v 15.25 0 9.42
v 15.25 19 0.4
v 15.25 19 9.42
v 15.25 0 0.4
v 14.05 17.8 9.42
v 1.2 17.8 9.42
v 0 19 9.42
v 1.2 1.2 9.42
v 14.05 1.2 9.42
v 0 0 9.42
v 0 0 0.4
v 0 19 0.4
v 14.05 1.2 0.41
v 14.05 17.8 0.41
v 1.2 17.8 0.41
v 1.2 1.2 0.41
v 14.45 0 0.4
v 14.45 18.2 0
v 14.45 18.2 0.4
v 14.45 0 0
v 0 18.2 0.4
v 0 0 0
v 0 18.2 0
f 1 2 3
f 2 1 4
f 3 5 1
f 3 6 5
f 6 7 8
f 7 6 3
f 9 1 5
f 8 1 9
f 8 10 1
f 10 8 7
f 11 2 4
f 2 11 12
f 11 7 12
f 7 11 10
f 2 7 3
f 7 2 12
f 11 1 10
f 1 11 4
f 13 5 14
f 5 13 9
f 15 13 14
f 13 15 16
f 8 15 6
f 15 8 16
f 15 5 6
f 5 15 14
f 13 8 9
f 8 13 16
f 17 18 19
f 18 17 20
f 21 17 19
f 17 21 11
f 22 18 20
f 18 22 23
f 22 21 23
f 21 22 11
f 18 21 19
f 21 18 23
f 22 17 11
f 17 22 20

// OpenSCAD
// file: ../../Base/Boxes.scad
// Fischertechnik Box Foundation
// Pre-designed Boxes

use <Constants.scad>

include <PlacementOptions.scad>

box190Width = 190;
box190Depth = 130;
box130Width = 130;
box130Depth = 95;
boxUsageHeight = 33.9;
boxWallThickness = 2.4;
boxBaseThickness = 1.0;
boxWebWidth = 3.0;

// getBoxWallThickness()
// Gets the wall thickness of a Fischertechnik Box

function getBoxWallThickness() = boxWallThickness;

// Gets the usable height of a fischertechnik box
function getBoxUsageHeight() = boxUsageHeight;

// Gets the thickness of the Fischertechnik box base.
function getBoxBaseThickness() = boxBaseThickness;

// Gets the width of a box web
function getBoxWebWidth() = boxWebWidth;

// Gets the usable inner space of a Box 190 as an x/y-list
function getBox190Space() = [
    box190Width - 2*getBoxWallThickness(), 
    box190Depth - 2*getBoxWallThickness() ];

// Imports the Fischertechnik empty box 130x190 mm and places it at position 0,0
// 190x130 are the outer sizes, the inner space is slightly smaller. Use getBox190Space() to get the inner sizes.
// This module needs the STL file "Fischertechnik Box 130x190.stl" in the library path.
// The box is positioned that the usable inner space is at the 0,0,0 position. The

module Box190() {
    translate([-getBoxWallThickness(),-getBoxWallThickness(),-getBoxBaseThickness()])
        import("Fischertechnik Box 130x190.stl", convexity=3);
}

// Gets the usable inner space of a Box 130 as an x/y-list
function getBox130Space() = [
    box130Width - 2*getBoxWallThickness(), 
    box130Depth - 2*getBoxWallThickness() ];

// Imports the Fischertechnik empty box 95x130 mm and places it at position 0,0
// 190x130 are the outer sizes, the inner space is slightly smaller. Use getBox190Space() to get the inner sizes.
// This module needs the STL file "Fischertechnik Box 95x130.stl" in the library path.
// The box is positioned that the usable inner space is at the 0,0,0 position. The

module Box130() {
    translate([-getBoxWallThickness(),-getBoxWallThickness(),-getBoxBaseThickness()])
        import("Fischertechnik Box 95x130.stl", convexity=3);
}

// Creates a web at the specified box walls
// corner 0 = LowerLeft, 1 = UpperLeft, 2 = UpperRight, 3 = LowerRight
// side 0 = LeftOfCorner, 1 = RightOfCorner
// distance = Distance in mm from the corner
// box = inner width and depth of the box (default: Box 190)
// webWidth = length of the web (default is 3 mms)
// webThickness = thickness of the web (default is 1 mm)

module BoxWeb(corner, side, distance, box=getBox190Space(), webWidth=getBoxWebWidth(), webThickness=1.0) {
    sink = getBoxWallThickness()/2;

    width = (corner % 2 == 0) ? 
            (side == LeftOfCorner ? webWidth : webThickness) :
            (side == LeftOfCorner ? webThickness : webWidth);

    depth = (corner % 2 == 0) ? 
            (side == RightOfCorner ? webWidth : webThickness) :
            (side == RightOfCorner ? webThickness : webWidth);
    
    xDiff = corner == LowerLeft ? 
                (side == LeftOfCorner ? -sink : distance) :
            (corner == UpperLeft ?                
                (side == LeftOfCorner ? distance : -sink) :
            (corner == UpperRight ?
                (side == LeftOfCorner ? box.x-webWidth+sink : box.x-distance-webThickness) :
                (side == LeftOfCorner ? box.x-distance-webThickness: box.x-webWidth+sink)));

    yDiff = corner == LowerLeft ? 
                (side == RightOfCorner ? -sink : distance) :
            (corner == UpperLeft ?
                (side == RightOfCorner ? box.y-distance : box.y-webWidth+sink) :
            (corner == UpperRight ?
                (side == RightOfCorner ? box.y-webWidth+sink : box.y-distance) :
                (side == RightOfCorner ? distance : -sink)));
    
    translate([xDiff, yDiff, -getExcess()])
        cube([width, depth, boxUsageHeight + 2*getExcess()]);
}
// file: ../../Base/Rotation.scad
// Fischertechnik Box Foundation
// Geometry Helpers Rotation

include <PlacementOptions.scad>

// getRotatedSpace(space, rotation=NoRotation)
// Rotates the space dependent on the specified rotation

function getRotatedSpace(space, rotation=NoRotation) = [
    (rotation == Rotate90 || rotation == Rotate270) ? space.y : space.x,
    (rotation == Rotate90 || rotation == Rotate270) ? space.x : space.y
];

// Rotates the given space around the fixed left lower corner
// space = the space the children needs as width/depth list [width,depth]
// rotation = 0 Rotate0 degrees, 1 Rotate90 degrees, 2 Rotate180 degrees, 3 Rotate270 degrees (equivalent to -90)

module RotateFix(space, rotation=Rotate0) {
    dy = (rotation == Rotate0 || rotation == Rotate270) ? 0 :
        (rotation == Rotate90) ? space.x :
        space.y;
    dx = (rotation < Rotate180) ? 0 :
        (rotation == Rotate180) ? space.x :
        space.y;
    
    translate([dx, dy, 0])
        rotate([0, 0, rotations[rotation]])
            children();
}
// file: ../../Base/Alignment.scad
// Fischertechnik Box Foundation
// Geometry Helpers Alignment

include <PlacementOptions.scad>

// getAlignedX(elementWidth, spaceWidth, align=AlignRight, offset=0)
// Gets the aligned X offset of an element with the given
// width in the given space.
// elementWidth = The width of the element to positon
// spaceWidth = The space where the element should be aligned
// align = 0 AlignLeft, 1 AlignCenter, 2 AlignRight
// offset = an optional offset from the aligned position. When
// aligned left or centered, then positive values are in X direction.
// When aligned right then positive values are in negative X direction.

function getAlignedX(elementWidth, spaceWidth, align=AlignRight, offset=0) =
    (align == AlignLeft) ?
        offset :
        ((align == AlignCenter) ?
        (spaceWidth - elementWidth)/2 + offset :
        spaceWidth - offset - elementWidth);

// getAlignedY(elementDepth, spaceDepth, align=AlignTop, offset=0)
// Gets the aligned Y offset of an element with the given
// depth in the given space.
// elementDepth = The depth of the element to positon
// spaceDepth = The space where the element should be aligned
// align = 0 AlignBottom, 1 AlignCenter, 2 AlignTop
// offset = an optional offset from the aligned position. When
// aligned bottom or centered, then positive values are in Y direction.
// When aligned top then positive values are in negative Y direction.

function getAlignedY(elementDepth, spaceDepth, align=AlignTop, offset=0) =
    (align == AlignBottom) ?
        offset :
        ((align == AlignCenter) ?
        (spaceDepth - elementDepth)/2 + offset :
        spaceDepth - offset - elementDepth);
// file: ../../Base/PlacementOptions.scad
// Fischertechnik Box Foundation
// Placement Options

// Alignment
NoAlign = 0;
AlignLeft = 1;
AlignBottom = 2;
AlignCenter = 3;
AlignRight = 4;
AlignTop = 5;

// Element rotation degree steps
rotations = [0, -90, -180, -270];

// Rotation
NoRotation = 0;
Rotate0 = 0;
Rotate90 = 1;
Rotate180 = 2;
Rotate270 = 3;

// Docking (seen from above)
NoDock = -1;
DockLeft = 0;
DockTop = 1;
DockRight = 2;
DockCorner = 2;
DockBottom = 3;

// Web corners
LowerLeft = 0;
UpperLeft = 1;
UpperRight = 2;
LowerRight = 3;

// Web position relative to corner
LeftOfCorner = 0;
RightOfCorner = 1;
// file: ../../Base/Placement.scad
// Fischertechnik Box Foundation
// Geometry Helpers Placement

use <Constants.scad>
use <Alignment.scad>
use <Rotation.scad>
use <Boxes.scad>

include <PlacementOptions.scad>

// Place(x=0, y=0, elementSpace=[0,0], alignX=AlignLeft, alignY=AlignBottom, rotation=Rotate0, boxSpace=getBox190Space())
// Places the child at the specified position
// y = Y-Position. This is a relative position when an X aligment is specified.
// x = X-Position. This is a relative position when an Y aligment is specified.
// elementSpace = space of the element to be placed [x,y]
// alignX = -1=NoAlign, 0 AlignLeft, 1 AlignCenter, 3 AlignRight (elementSpace and boxSpace required!)
// alignY = -1=NoAlign, 2 AlignBottom, 1 AlignCenter, 4 AlignTop (elementSpace and boxSpace required!)
// rotation = 0 Rotate0 0 degrees, 1 Rotate90 90 degrees, 
// 2 Rotate180 180 degrees, 3 Rotate270 270 degrees (equivalent to -90)
// boxSpace = Inner space of the box where the placement occurs [x,y] - default is Box 190x130 inner space

module Place(x=0, y=0, elementSpace=[0,0], 
  alignX=AlignLeft, alignY=AlignBottom, 
  rotation=NoRotation, boxSpace=getBox190Space()) {

    module Position(x, y, space, rotation=Rotate0) {
        translate([x, y, 0])
            RotateFix(space, rotation)
                children();
    }

    space = getRotatedSpace(elementSpace, rotation);
    alignedX = getAlignedX(space.x, boxSpace.x, alignX, x);
    alignedY = getAlignedY(space.y, boxSpace.y, alignY, y);
    Position(alignedX, alignedY, elementSpace, rotation)
        children();
}

// Center(space=getBox130Space(), elementSpace=[0,0])
// space = Space where the children is centered. For cylinder use centered=true and no elementSpace.
// elementSpace = space of the element to be centered [x,y]

module Center(space=getBox190Space(), elementSpace=[0,0]) {
    translate([(space.x - elementSpace.x) / 2, (space.y - elementSpace.y) / 2])
        children(0);
}

// CenterHorizontal(width=0, y=0, offset=0, space=getBox130Space())
// space = Space where the children is centered. For cylinder use centered=true and no elementSpace.
// elementSpace = space of the element to be centered [x,y]

module CenterHorizontal(width=0, y=0, offset=0, space=getBox190Space()) {
    translate([(space.x - width) / 2 + offset, y])
        children(0);
}

// CenterVertical(depth=0, x=0, offset=0, space=getBox130Space())
// space = Space where the children is centered. For cylinder use centered=true and no elementSpace.
// elementSpace = space of the element to be centered [x,y]

module CenterVertical(depth=0, x=0, offset=0, space=getBox190Space()) {
    translate([x, (space.y - depth) / 2 + offset])
        children(0);
}
// file: ../../Elements/AxisClip10.scad
// Fischertechnik Box Library
// Axis for clip 10
// 31023

use <../ModelBase/Simple.scad>

width = 12;
depth = 12;
height = 23;

// getAxisClip10Space()
// Gets the space of a frame for a clip 10 with spring ring (mot2)

function getAxisClip10Space() = [width, depth, height];

// AxisClip10()
// Axis for clip 10 with spring ring (mot2)

module AxisClip10() {
    LeveledAxisWithSpace(height, height-10, getAxisClip10Space());
}

// Tests
color("lightgray")
AxisClip10();
// file: ../../Base/Constants.scad
// Fischertechnik Box Foundation
// Constants

// Constant values necessary for multiple elements

// Base constants
dividerThickness = 1.2;
excess = 0.01;
fragments = 90;
tolerance = 0.8;

// Gets the thickness of a divider 
function getDividerThickness() = dividerThickness;

// Gets the excess that is used to merge walls into each other
function getExcess() = excess;

// Gets amount of fragments of a cylinder
function getFragments() = fragments;

// Gets the inner tolerance of a frame to each side
function getTolerance() = tolerance;


// Fischertechnik specific constants
axisDiameter = 4;
axisBottomDiameter = axisDiameter + 1;
standardEdgeDistance = 2.5;
standardWebDistance = 11.5;
standardCornerLength = 15;
tubeWallFactor = 0.8;

// Gets axis diameter
function getAxisDiameter() = axisDiameter;

// Gets axis bottom diameter for thicker part at the bottom
function getAxisBottomDiameter() = axisBottomDiameter;

// gets the standard distance to the wall of the box for dockable frames with webs
function getStandardEdgeDistance() = standardEdgeDistance;

// gets the standard distance of each web to the corner of the dockable frame
function getStandardWebDistance() = standardWebDistance;

// gets the standard length of the corner walls of a dockable frame
function getStandardCornerLength() = standardCornerLength;

// gets the wall thickness of a tube.
function getTubeWallThickness() = tubeWallFactor * getDividerThickness();
// file: ../../Elements/FrameAngleIsosceles.scad
// Fischertechnik Box Library
// Frame for isosceles angle blocks
// 31011

use <../Base/Constants.scad>
use <../ModelBase/Simple.scad>

width = 45 / 4;
depth = 15;
height = 9;

// getFrameAngleEquilateralSpace
// Gets the space the frame angle equilateral needs for count blocks as width and depth (.x and .y as a list)
// count = Count of equilateral angle blocks

function getFrameAngleIsoscelesSpace(count=1) = getFrameOuterVolume([width * count, depth, height]);
/*[
    frameGridWidth * count + 2 * getWallThickness() + getTolerance(), 
    frameGridDepth + 2 * getWallThickness() + getFrameInnerGap()];*/

// FrameAngleIsosceles(count)
// count = Count of angle blocks in x direction
// The walls of the frame are 9 mm high.
// The complete frame has a tolerance of addition 1 mm in each direction.

module FrameAngleIsosceles(count=1) {
    innerVolume = getFrameInnerVolume([width * count, depth, height]);
    Frame(innerVolume);
}

// Tests
color ("lightgray")
FrameAngleIsosceles();
// file: ../TestPrint.scad
// 3D Print Test Base

use <../Base/Constants.scad>

use <../Elements/AxisClip10.scad>

module TestPrint(elementSpace) {
    cube([elementSpace.x, elementSpace.y, 0.4]);
    translate([0,0,0.4+getExcess()]) {
        children();
    }
}

TestPrint(getAxisClip10Space())
    AxisClip10();
// main file
// 3D Print Test Base
// FrameAngleIsosceles

use <../TestPrint.scad>
use <../../Elements/FrameAngleIsosceles.scad>

TestPrint(getFrameAngleIsoscelesSpace())
    FrameAngleIsosceles();
